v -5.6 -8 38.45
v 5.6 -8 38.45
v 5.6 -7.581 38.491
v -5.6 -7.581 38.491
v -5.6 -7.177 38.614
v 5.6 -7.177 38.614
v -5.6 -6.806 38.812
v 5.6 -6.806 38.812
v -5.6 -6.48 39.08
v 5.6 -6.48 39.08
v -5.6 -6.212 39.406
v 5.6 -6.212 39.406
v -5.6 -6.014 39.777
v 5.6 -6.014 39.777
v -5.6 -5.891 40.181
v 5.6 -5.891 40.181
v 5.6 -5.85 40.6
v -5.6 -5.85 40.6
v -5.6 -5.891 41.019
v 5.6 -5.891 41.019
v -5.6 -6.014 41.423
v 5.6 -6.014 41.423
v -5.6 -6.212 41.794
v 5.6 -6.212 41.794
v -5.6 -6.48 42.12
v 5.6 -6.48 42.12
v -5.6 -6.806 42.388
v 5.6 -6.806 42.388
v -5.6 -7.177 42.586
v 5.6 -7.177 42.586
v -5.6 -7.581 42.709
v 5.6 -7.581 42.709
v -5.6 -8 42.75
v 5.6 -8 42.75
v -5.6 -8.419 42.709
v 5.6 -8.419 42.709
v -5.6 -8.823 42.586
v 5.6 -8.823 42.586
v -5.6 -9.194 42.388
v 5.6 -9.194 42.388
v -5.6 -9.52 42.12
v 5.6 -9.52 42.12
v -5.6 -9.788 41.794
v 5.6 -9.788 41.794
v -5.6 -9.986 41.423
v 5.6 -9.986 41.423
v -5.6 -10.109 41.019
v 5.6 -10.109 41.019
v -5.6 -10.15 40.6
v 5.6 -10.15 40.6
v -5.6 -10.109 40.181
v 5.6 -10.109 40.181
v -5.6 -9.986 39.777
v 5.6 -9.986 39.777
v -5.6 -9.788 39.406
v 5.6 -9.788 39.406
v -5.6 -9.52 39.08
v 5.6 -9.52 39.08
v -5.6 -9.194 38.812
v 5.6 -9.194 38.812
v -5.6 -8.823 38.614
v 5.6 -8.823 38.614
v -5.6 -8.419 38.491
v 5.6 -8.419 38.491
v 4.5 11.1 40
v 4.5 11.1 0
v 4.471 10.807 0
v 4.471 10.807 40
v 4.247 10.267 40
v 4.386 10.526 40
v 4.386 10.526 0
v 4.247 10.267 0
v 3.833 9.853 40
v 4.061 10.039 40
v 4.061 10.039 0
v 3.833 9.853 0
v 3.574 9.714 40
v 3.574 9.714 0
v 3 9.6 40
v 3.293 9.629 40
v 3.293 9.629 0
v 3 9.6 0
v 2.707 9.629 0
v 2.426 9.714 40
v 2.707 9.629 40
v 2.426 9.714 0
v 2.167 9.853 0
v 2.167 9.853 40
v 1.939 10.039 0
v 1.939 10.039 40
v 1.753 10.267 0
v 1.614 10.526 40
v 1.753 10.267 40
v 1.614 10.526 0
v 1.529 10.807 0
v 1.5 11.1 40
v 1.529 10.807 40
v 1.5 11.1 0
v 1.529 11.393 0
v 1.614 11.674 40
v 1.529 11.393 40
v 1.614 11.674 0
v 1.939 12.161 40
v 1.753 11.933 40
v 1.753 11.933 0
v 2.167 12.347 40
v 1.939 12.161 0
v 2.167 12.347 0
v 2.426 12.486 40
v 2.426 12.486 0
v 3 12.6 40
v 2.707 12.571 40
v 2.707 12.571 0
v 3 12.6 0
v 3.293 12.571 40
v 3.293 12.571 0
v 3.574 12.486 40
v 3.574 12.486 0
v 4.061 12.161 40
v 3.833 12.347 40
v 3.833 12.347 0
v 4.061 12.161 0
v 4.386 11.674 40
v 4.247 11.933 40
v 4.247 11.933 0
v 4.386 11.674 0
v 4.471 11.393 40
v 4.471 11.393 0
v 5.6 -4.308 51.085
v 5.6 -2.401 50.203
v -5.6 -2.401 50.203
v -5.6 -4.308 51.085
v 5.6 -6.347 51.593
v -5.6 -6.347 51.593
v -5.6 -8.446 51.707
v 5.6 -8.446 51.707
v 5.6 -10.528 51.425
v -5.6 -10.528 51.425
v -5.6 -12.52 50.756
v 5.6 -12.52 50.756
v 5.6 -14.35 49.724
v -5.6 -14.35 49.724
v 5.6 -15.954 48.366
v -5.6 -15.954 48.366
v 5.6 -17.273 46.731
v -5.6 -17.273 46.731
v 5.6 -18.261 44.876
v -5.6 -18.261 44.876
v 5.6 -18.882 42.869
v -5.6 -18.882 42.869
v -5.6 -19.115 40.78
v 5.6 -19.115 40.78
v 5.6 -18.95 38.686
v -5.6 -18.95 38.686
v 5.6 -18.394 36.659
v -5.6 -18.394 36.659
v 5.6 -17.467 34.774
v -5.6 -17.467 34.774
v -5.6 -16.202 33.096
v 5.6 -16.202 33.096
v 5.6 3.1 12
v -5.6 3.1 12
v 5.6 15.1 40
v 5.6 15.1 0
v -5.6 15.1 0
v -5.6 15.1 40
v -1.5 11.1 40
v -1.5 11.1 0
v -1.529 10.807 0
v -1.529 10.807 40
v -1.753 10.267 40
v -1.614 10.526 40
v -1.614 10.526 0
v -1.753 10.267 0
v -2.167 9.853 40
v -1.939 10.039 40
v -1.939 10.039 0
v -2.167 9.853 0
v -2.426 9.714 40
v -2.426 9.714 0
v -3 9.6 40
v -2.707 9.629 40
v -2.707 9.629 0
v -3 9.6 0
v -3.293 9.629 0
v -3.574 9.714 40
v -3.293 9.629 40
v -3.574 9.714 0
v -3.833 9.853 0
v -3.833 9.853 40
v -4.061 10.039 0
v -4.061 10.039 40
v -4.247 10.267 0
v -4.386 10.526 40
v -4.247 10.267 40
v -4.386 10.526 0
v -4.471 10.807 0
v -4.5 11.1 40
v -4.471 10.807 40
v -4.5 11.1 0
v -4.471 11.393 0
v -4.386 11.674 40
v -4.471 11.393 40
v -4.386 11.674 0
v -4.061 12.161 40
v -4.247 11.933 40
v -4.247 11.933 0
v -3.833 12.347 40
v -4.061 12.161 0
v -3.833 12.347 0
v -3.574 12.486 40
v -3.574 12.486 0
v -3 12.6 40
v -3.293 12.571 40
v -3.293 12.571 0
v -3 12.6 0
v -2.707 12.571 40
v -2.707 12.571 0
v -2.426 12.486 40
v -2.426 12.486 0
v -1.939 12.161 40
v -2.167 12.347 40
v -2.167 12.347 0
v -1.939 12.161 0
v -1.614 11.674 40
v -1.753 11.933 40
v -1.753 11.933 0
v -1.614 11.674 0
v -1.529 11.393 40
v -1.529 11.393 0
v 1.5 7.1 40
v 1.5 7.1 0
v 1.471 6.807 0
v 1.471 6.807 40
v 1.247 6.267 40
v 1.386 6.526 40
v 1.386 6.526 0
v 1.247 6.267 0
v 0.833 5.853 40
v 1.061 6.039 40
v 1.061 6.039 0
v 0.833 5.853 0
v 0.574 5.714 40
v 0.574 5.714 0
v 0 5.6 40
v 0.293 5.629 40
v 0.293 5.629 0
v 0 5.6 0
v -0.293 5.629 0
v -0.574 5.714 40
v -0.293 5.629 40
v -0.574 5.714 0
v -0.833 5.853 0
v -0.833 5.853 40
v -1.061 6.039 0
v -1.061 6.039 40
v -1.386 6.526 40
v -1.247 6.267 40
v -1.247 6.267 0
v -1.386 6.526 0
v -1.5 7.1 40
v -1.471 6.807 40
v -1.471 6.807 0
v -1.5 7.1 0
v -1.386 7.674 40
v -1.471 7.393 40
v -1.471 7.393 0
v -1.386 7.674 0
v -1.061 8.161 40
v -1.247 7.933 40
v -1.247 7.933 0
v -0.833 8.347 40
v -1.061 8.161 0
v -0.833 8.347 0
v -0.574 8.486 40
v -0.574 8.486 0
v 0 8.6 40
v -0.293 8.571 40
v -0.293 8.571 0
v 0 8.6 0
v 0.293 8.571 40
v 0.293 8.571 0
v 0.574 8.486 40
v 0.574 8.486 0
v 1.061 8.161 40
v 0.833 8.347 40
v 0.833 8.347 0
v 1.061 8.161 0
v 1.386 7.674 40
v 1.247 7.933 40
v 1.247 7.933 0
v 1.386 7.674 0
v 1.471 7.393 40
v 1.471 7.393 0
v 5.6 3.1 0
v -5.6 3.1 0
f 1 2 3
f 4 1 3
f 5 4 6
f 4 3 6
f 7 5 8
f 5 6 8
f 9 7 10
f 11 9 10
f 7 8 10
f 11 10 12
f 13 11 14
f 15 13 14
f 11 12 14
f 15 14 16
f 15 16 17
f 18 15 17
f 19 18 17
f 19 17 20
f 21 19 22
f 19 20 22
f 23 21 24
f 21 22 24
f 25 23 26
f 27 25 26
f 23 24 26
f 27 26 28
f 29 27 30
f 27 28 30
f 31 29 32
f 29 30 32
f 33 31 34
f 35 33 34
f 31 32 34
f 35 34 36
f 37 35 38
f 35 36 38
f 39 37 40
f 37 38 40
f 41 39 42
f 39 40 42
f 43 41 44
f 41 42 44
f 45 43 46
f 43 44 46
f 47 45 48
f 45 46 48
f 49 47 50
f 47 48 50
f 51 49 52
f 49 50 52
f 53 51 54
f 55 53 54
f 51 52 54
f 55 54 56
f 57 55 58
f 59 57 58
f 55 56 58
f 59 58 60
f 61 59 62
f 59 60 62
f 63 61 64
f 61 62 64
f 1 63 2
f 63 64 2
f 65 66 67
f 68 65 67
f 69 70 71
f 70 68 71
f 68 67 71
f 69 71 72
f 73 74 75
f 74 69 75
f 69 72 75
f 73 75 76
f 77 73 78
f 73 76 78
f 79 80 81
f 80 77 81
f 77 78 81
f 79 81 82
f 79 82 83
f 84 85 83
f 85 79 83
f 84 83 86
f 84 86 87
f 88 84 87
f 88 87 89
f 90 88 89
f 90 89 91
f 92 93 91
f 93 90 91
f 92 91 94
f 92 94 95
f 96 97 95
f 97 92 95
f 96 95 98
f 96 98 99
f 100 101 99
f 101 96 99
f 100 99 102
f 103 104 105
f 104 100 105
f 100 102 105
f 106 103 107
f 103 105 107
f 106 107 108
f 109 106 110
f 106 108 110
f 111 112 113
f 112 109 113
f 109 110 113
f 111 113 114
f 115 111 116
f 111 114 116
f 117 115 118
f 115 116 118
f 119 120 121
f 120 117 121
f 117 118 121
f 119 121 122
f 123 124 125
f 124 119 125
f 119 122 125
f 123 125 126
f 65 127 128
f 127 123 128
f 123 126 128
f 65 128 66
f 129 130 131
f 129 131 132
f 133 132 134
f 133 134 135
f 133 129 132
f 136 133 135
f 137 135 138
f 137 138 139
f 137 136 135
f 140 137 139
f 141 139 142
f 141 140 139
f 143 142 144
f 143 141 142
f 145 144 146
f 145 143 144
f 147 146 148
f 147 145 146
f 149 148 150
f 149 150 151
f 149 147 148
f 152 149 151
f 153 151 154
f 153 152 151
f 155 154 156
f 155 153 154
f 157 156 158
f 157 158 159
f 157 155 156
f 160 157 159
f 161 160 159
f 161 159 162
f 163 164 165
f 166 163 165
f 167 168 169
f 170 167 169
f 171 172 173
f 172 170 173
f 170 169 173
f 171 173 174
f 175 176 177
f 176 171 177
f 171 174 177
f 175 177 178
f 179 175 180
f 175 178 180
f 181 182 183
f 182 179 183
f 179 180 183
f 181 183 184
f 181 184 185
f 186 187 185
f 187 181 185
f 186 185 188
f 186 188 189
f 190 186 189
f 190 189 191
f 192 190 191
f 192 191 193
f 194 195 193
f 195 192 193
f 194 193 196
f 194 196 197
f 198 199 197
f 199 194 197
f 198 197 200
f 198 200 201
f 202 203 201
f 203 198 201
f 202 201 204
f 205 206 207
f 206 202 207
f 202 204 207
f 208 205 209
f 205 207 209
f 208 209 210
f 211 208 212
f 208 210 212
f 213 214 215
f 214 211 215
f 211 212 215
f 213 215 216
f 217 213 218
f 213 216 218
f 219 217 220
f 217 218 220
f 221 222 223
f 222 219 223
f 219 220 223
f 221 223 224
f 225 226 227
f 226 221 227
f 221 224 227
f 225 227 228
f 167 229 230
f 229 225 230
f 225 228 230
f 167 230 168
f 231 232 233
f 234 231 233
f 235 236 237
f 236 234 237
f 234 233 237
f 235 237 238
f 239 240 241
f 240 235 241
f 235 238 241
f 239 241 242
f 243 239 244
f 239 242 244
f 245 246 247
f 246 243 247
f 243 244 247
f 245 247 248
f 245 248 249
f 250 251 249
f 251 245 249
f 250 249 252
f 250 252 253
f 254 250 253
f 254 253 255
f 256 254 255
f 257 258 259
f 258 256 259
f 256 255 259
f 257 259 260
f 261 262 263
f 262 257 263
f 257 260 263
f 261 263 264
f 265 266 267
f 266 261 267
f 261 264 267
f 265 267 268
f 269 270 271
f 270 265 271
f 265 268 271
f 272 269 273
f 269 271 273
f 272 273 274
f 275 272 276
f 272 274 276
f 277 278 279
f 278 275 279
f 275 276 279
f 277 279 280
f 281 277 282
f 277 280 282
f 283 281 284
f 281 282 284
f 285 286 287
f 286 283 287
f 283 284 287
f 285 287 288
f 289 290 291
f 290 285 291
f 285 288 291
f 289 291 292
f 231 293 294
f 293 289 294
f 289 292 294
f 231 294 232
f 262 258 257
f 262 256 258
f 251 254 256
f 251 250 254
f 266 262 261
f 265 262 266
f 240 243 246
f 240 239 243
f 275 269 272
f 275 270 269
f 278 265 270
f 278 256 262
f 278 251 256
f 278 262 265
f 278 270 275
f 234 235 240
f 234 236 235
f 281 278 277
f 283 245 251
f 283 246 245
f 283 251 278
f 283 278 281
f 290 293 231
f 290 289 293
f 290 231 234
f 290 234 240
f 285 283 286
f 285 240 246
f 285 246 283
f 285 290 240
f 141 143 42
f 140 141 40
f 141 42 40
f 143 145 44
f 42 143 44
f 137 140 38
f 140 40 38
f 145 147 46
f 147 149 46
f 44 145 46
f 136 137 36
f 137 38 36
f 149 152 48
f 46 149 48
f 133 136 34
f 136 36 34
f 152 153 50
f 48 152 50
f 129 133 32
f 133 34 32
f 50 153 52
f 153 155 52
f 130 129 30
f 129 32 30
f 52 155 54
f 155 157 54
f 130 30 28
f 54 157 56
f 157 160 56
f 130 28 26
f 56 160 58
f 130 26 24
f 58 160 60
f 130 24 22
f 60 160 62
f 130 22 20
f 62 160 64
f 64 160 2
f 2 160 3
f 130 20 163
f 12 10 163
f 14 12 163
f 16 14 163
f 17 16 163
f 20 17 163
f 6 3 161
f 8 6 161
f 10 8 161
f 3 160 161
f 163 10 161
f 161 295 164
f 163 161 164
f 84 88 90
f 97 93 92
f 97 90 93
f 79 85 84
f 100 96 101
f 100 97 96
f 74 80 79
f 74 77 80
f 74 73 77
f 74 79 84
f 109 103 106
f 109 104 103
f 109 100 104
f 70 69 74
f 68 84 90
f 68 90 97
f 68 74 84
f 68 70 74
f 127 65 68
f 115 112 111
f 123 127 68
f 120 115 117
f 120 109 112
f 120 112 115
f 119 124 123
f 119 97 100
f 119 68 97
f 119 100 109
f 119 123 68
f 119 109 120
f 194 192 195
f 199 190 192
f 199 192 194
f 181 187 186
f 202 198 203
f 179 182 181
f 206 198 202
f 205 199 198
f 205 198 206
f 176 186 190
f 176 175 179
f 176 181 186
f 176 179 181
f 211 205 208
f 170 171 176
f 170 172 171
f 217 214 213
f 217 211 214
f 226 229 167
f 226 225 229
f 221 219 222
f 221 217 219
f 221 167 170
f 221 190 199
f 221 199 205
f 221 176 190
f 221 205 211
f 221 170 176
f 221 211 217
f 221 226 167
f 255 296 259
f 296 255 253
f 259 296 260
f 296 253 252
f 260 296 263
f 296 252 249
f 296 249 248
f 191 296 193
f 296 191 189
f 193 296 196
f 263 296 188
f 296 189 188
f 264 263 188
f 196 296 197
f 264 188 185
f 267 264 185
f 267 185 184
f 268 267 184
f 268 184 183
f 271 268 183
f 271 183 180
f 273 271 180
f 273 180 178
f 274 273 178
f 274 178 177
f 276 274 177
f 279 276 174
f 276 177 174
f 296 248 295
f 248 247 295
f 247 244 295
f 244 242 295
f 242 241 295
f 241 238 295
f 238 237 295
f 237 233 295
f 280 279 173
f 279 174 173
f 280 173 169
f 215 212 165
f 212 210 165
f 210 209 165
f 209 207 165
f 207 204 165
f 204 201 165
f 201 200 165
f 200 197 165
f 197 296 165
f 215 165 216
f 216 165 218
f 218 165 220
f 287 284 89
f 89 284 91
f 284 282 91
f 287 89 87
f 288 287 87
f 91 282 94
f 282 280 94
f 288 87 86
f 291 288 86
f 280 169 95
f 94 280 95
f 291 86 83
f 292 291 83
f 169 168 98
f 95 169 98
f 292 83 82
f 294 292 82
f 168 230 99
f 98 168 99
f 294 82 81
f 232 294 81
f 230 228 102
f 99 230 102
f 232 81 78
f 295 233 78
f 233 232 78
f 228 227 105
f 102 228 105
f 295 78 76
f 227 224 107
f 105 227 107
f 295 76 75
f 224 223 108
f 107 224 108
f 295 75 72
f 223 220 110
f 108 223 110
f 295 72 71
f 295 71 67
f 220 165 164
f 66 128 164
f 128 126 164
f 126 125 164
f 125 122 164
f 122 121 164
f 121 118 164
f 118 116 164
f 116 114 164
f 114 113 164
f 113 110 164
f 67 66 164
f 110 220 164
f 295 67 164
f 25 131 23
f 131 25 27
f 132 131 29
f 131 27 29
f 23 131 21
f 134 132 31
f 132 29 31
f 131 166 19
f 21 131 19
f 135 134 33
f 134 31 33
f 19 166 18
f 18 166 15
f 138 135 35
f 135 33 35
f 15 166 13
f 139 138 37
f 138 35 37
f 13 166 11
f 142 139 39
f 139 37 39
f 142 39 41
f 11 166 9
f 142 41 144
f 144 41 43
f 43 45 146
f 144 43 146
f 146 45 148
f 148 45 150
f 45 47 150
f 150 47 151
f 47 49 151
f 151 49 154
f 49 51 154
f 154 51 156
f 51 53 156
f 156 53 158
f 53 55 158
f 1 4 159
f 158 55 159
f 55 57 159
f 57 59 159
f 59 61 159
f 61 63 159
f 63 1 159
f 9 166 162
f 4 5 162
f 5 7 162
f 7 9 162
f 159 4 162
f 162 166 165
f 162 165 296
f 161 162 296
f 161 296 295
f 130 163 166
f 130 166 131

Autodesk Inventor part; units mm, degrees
ref_plane "YZ Plane" through (0, 0, 0) normal (1, 0, 0) x (0, 1, 0)
ref_plane "XZ Plane" through (0, 0, 0) normal (0, 1, 0) x (-1, 0, 0)
ref_plane "XY Plane" through (0, 0, 0) normal (0, 0, 1) x (1, 0, 0)
ref_plane "Work Plane1" through (0, 0, 0) normal (0, 0, 1) x (1, 0, 0)
sketch "Sketch1" plane through (0, 0, 0) normal (0, 0, 1) x (1, 0, 0)
  circle A0 centre (0, 7.1) radius 1.5 projected
  circle A1 centre (3, 11.1) radius 1.5
  circle A2 centre (-3, 11.1) radius 1.5
  line L0 (-5.8, -25.5252) -> (-5.8, 18.8938) projected
  line L1 (-5.8, 18.8938) -> (5.8, 18.8938) projected
  line L2 (5.8, 18.8938) -> (5.8, -25.5252) projected
  line L3 (-5.6, 3.1) -> (5.6, 3.1)
  line L4 (5.6, 3.1) -> (5.6, 15.1)
  line L5 (5.6, 15.1) -> (-5.6, 15.1)
  line L6 (-5.6, 15.1) -> (-5.6, 3.1)
  line L7 (0, 7.1) -> (0, 6.0369) construction
  point P0 (0, 0)
  dimension "d0" = 0.2
  dimension "d1" = 0.2
  dimension "d3" = 4
  dimension "d4" = 4
  dimension "d10" = 4
  dimension "d11" = 3
  dimension "d12" = 3
extrude "Extrusion1" add sketch "Sketch1" along normal blind 40
sketch "Sketch2" plane through (5.6, 3.1, 0) normal (1, 0, 0) x (0, 0, -1)
  circle A0 centre (-40.6, -11.1) radius 2.05 construction
  line L0 (-40, 0) -> (-40, 12) projected
  circle A1 centre (-40.6, -11.1) radius 11.1162
  line L1 (-40, 12) -> (-50.2033, -5.5012)
  line L2 (0, 0) -> (-40, 0) projected
  circle A2 centre (-40.6, -11.1) radius 2.15
  line L3 (-33.0963, -19.3015) -> (-12, 0)
  point P0 (0, -3.1)
  dimension "d7" = 4.3
  dimension "d14" = 12
extrude "Extrusion2" add sketch "Sketch2" against normal up to surface (11.2 mm away)
properties part number "pivot module stalk"
